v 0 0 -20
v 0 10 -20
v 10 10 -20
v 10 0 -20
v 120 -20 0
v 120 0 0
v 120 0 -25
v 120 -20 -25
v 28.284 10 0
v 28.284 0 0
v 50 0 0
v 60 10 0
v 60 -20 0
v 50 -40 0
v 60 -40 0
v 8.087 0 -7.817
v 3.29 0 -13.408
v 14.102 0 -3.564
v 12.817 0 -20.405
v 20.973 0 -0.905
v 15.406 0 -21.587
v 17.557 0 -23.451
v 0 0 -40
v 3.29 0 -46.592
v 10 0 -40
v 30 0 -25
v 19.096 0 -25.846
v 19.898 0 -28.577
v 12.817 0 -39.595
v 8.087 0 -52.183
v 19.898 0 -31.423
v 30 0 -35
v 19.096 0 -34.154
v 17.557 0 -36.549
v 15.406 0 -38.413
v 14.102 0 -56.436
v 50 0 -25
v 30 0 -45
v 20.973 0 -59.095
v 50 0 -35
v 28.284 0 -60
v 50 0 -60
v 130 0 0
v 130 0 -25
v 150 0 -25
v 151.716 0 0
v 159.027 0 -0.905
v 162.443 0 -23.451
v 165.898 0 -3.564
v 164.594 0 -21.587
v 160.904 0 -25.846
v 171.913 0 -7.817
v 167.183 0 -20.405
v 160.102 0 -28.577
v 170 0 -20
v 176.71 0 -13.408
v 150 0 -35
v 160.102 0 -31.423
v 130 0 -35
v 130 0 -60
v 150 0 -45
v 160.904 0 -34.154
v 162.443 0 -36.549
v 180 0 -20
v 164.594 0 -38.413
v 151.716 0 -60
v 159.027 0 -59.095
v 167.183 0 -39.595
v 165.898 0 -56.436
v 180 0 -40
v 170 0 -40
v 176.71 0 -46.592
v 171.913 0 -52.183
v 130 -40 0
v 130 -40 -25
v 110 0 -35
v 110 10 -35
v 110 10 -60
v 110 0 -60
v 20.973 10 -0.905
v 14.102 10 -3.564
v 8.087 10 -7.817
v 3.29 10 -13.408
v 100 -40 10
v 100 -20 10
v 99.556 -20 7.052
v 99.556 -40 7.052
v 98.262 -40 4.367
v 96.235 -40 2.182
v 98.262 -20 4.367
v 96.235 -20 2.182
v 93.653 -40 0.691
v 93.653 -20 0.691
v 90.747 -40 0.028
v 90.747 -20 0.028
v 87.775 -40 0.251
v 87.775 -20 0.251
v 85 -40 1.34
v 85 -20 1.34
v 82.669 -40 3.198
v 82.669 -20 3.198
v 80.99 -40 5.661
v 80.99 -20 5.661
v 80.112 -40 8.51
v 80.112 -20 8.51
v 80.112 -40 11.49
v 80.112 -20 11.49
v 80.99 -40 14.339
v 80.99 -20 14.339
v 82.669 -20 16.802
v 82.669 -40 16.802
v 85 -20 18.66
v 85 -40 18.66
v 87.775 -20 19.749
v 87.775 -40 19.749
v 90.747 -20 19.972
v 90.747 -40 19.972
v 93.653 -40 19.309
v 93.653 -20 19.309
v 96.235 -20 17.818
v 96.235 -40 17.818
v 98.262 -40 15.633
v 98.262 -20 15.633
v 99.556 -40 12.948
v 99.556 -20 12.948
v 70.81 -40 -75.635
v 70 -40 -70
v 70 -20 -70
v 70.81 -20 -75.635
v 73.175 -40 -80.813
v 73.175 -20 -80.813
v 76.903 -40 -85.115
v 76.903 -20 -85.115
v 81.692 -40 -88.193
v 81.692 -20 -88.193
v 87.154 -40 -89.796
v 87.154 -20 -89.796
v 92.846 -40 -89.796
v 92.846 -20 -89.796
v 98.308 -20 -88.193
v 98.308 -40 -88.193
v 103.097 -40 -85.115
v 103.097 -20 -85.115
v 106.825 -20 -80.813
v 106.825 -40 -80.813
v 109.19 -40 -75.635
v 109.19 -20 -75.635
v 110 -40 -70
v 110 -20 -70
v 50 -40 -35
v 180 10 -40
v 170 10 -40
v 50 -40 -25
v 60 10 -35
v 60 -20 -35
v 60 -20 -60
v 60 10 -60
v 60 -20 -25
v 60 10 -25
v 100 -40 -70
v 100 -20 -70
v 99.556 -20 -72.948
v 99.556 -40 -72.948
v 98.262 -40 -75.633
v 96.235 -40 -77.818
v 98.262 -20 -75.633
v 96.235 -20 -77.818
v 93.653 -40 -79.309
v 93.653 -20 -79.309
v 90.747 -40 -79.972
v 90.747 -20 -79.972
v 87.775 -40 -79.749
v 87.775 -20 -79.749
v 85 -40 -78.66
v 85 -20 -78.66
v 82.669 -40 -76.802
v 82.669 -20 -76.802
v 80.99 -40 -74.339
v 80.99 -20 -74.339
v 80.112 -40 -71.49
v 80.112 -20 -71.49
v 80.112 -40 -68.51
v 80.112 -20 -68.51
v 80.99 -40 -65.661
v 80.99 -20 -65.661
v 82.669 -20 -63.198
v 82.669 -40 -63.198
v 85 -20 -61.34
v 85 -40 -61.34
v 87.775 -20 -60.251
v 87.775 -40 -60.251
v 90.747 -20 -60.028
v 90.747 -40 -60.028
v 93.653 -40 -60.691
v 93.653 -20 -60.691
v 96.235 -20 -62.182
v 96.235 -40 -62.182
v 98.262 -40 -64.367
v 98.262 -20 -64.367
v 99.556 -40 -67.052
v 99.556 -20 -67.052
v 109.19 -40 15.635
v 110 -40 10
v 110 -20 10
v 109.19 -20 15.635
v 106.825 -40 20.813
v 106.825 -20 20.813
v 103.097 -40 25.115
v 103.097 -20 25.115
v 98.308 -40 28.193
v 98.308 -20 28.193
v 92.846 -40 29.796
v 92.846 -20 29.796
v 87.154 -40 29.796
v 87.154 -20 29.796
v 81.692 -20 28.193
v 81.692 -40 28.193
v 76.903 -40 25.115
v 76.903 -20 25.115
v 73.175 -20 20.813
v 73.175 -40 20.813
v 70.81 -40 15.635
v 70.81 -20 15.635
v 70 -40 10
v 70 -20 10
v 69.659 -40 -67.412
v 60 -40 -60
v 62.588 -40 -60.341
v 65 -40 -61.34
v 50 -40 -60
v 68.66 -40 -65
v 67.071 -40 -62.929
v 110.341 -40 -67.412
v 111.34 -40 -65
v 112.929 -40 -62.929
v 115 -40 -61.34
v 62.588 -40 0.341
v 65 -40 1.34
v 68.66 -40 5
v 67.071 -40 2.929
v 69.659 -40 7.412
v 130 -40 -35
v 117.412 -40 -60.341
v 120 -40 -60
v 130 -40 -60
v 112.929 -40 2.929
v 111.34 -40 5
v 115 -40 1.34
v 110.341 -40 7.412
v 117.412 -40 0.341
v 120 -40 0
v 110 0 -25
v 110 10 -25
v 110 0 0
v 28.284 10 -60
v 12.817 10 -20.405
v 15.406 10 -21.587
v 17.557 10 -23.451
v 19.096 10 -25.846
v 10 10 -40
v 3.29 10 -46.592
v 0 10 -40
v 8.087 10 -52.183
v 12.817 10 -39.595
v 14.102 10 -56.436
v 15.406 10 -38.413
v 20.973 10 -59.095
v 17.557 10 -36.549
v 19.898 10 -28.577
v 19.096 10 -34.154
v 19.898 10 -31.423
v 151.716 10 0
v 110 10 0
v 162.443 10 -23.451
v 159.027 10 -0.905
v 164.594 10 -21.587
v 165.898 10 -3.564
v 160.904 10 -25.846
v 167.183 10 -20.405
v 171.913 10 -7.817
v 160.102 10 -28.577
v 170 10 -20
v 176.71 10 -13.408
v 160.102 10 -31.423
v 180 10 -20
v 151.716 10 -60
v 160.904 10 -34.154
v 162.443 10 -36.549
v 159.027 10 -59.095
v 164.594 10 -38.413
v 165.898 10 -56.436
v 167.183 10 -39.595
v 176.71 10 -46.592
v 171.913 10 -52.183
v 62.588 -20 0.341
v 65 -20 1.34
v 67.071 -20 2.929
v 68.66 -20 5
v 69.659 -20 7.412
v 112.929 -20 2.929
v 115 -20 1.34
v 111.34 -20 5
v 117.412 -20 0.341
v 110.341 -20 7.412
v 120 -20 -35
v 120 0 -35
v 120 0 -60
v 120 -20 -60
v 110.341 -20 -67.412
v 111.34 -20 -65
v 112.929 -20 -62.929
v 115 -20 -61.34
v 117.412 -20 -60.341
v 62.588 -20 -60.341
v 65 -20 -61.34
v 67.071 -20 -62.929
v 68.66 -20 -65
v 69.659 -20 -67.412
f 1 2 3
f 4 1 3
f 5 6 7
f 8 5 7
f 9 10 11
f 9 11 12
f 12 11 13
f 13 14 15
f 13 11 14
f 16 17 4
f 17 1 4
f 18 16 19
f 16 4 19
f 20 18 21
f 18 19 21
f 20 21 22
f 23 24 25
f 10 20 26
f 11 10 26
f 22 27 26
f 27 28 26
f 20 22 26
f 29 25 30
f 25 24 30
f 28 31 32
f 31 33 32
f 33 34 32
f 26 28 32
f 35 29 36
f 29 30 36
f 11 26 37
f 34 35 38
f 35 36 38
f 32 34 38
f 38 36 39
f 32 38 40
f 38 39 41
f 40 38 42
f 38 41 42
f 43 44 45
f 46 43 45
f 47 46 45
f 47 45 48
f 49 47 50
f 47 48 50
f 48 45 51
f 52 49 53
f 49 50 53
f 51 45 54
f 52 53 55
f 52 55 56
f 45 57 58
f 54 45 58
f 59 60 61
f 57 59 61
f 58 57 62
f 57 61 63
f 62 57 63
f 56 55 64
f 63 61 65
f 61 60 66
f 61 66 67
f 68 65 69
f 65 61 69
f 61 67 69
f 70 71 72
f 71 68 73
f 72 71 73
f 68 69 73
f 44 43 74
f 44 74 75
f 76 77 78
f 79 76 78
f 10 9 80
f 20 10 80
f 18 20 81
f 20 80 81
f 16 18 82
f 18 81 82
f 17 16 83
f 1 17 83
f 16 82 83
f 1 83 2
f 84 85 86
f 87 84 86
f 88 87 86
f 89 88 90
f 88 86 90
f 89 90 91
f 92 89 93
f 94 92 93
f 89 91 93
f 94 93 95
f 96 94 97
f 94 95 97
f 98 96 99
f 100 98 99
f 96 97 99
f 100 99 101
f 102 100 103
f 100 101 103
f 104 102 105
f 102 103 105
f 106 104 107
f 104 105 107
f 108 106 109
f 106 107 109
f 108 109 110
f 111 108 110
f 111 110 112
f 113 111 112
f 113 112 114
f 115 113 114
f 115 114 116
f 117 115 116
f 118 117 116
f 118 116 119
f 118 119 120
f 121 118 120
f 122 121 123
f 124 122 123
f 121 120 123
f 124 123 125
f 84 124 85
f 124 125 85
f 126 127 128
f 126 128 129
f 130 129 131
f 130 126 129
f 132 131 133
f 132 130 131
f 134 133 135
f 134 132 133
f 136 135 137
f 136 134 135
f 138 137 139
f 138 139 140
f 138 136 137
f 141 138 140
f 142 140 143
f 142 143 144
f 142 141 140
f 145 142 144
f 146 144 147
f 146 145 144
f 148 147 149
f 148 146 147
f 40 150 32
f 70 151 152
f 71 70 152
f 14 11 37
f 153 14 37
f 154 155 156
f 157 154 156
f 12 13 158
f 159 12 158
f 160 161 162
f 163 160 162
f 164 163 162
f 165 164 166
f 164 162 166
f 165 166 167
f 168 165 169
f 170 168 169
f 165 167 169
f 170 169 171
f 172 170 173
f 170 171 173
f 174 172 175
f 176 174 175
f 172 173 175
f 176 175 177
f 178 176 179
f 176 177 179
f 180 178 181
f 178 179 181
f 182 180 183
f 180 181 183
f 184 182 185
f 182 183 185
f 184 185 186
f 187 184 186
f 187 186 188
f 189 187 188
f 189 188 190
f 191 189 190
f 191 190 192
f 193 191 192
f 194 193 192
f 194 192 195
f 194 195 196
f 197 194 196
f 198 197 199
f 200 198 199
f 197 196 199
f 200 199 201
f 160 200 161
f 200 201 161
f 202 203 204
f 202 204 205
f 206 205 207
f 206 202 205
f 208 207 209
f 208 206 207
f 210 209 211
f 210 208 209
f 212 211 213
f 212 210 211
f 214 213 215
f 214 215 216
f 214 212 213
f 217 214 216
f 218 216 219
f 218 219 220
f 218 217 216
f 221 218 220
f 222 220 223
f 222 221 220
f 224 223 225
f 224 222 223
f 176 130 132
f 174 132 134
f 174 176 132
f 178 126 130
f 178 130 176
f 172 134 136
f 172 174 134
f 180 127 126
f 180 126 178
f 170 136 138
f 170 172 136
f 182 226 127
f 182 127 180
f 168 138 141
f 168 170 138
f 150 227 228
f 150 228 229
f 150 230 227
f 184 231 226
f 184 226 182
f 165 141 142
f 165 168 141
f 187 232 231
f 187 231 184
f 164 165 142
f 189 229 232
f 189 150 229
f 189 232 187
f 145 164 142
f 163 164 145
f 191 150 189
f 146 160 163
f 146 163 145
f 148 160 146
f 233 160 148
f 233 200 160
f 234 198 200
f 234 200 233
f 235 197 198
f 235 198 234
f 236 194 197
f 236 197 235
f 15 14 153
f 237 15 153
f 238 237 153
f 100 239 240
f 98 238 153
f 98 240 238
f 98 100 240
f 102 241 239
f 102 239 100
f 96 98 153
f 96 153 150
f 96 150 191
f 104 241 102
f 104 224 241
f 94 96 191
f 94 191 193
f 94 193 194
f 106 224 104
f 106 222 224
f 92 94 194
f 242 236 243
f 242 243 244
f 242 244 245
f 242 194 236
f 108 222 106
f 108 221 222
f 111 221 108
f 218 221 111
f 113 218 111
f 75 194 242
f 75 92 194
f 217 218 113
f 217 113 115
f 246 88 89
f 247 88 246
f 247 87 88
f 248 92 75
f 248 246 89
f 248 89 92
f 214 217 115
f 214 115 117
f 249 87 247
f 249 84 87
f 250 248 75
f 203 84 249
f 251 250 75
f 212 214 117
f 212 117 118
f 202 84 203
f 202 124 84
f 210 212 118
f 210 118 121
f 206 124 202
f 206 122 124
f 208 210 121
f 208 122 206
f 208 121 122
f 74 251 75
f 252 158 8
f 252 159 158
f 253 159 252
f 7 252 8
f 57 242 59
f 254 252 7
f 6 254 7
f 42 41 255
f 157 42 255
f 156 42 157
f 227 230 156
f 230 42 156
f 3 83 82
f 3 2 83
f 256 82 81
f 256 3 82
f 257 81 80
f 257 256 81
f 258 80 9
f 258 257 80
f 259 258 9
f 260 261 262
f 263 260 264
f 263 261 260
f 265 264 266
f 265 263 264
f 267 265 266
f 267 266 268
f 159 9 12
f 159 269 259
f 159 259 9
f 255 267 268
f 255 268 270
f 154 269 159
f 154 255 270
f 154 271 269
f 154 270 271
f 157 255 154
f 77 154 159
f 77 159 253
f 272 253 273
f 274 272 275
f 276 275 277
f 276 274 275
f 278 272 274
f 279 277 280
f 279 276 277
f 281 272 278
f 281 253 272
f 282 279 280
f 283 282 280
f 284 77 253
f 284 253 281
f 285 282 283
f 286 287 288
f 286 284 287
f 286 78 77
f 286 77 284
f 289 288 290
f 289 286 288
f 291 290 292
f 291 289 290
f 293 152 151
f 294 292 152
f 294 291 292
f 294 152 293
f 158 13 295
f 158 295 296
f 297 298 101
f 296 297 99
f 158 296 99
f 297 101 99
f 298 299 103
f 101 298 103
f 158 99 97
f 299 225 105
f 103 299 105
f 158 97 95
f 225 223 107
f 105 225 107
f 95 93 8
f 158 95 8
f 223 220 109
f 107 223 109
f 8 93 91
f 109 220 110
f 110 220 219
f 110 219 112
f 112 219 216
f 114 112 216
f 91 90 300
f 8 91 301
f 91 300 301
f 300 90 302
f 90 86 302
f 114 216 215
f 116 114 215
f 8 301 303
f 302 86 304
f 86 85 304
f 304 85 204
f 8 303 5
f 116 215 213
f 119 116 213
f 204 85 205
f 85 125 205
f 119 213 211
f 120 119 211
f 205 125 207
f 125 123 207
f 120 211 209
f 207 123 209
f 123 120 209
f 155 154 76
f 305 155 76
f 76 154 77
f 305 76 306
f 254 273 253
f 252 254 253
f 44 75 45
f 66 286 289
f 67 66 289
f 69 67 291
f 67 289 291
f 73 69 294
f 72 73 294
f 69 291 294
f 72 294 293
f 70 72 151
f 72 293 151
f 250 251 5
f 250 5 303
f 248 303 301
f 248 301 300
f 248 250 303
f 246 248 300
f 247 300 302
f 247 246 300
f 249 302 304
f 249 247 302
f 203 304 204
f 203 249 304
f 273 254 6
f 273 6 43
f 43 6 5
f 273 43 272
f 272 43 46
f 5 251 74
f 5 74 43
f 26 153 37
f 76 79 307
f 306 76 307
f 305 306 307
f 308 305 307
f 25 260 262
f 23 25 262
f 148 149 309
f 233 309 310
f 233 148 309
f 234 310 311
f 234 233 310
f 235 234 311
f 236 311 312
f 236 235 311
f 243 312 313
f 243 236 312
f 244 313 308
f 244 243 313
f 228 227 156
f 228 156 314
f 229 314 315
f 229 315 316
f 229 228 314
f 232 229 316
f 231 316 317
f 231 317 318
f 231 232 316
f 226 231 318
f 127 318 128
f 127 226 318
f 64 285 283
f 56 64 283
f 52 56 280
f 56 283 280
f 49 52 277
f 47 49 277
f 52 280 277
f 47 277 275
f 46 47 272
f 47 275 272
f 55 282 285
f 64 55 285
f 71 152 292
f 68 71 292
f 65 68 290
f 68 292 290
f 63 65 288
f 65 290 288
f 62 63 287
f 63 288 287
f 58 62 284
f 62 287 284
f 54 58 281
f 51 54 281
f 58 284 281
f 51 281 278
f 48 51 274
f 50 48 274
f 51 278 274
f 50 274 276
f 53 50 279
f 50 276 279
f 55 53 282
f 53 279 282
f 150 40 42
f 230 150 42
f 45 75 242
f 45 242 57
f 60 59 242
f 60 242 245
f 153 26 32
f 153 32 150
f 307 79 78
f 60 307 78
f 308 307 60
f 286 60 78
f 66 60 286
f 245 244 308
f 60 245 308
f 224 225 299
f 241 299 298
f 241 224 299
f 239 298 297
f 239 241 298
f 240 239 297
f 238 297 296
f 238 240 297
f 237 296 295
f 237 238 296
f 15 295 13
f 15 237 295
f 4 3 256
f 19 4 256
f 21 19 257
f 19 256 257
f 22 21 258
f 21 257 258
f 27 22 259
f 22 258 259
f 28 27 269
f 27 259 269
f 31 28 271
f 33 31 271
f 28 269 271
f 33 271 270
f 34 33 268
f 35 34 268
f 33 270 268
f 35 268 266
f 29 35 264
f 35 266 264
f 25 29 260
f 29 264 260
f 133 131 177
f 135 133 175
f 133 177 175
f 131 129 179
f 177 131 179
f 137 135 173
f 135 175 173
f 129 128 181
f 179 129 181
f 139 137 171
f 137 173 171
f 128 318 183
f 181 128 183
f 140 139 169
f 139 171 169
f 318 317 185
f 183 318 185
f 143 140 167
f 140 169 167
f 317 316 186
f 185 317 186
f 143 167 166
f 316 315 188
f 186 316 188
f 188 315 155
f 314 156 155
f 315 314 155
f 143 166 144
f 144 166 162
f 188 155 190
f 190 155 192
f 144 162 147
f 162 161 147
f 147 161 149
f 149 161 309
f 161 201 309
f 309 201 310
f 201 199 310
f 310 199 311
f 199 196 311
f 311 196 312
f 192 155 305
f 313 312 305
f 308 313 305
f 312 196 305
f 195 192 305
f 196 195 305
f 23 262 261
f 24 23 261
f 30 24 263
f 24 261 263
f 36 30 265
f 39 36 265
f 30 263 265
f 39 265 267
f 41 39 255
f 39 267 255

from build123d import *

# Parameters (mm, degrees)
SKETCH1_W           = 180
SKETCH1_H           = 60
BOSS_EXTRUDE1_DEPTH = 10
CUT_EXTRUDE1_DEPTH  = 10
SKETCH3_W           = 10
SKETCH3_H           = 60
BOSS_EXTRUDE2_DEPTH = 40
SKETCH4_W           = 10
SKETCH4_H           = 40
BOSS_EXTRUDE3_DEPTH = 20
CUT_EXTRUDE2_DEPTH  = 20
SKETCH6_W           = 10
SKETCH6_H           = 40
BOSS_EXTRUDE4_DEPTH = 20
CUT_EXTRUDE3_DEPTH  = 20
BOSS_EXTRUDE5_DEPTH = 20
SKETCH10_R          = 10
CUT_EXTRUDE4_DEPTH  = 20
SKETCH11_W          = 50
SKETCH11_H          = 25
CUT_EXTRUDE5_DEPTH  = 20
SKETCH12_W          = 60
SKETCH12_H          = 20
BOSS_EXTRUDE6_DEPTH = 10


with BuildPart() as part:
    # Sketch1 → Boss-Extrude1 (new body)
    with BuildSketch(Plane(origin=(0, 0, 0), x_dir=(1, 0, 0), z_dir=(0, 1, 0))):
        with Locations((90, 30)):
            Rectangle(SKETCH1_W, SKETCH1_H)
    extrude(amount=BOSS_EXTRUDE1_DEPTH)

    # Sketch2 → Cut-Extrude1 (cut)
    with BuildSketch(Plane(origin=(0, 10, 0), x_dir=(1, 0, 0), z_dir=(0, 1, 0))):
        with BuildLine():
            Line((0, 60), (0, 40))
            ThreePointArc((0, 40), (10.963763172, 54.494897428), (28.284271247, 60))
            Line((28.284271247, 60), (0, 60))
        make_face()
        with BuildLine():
            Line((10, 40), (0, 40))
            Line((0, 40), (0, 20))
            Line((0, 20), (10, 20))
            ThreePointArc((10, 20), (20, 30), (10, 40))
        make_face()
        with BuildLine():
            ThreePointArc((28.284271247, 0), (10.963763172, 5.505102572), (0, 20))
            Line((0, 20), (0, 0))
            Line((0, 0), (28.284271247, 0))
        make_face()
        with BuildLine():
            ThreePointArc((180, 20), (169.036236828, 5.505102572), (151.715728753, 0))
            Line((151.715728753, 0), (180, 0))
            Line((180, 0), (180, 20))
        make_face()
        with BuildLine():
            Line((180, 20), (180, 40))
            Line((180, 40), (170, 40))
            ThreePointArc((170, 40), (160, 30), (170, 20))
            Line((170, 20), (180, 20))
        make_face()
        with BuildLine():
            Line((180, 60), (151.715728753, 60))
            ThreePointArc((151.715728753, 60), (169.036236828, 54.494897428), (180, 40))
            Line((180, 40), (180, 60))
        make_face()
    extrude(amount=-CUT_EXTRUDE1_DEPTH, mode=Mode.SUBTRACT)

    # Sketch3 → Boss-Extrude2 (add)
    with BuildSketch(Plane(origin=(0, 0, 0), x_dir=(-1, 0, 0), z_dir=(0, -1, 0))):
        with Locations((-55, 30)):
            Rectangle(SKETCH3_W, SKETCH3_H)
        with Locations((-125, 30)):
            Rectangle(SKETCH3_W, SKETCH3_H)
    extrude(amount=BOSS_EXTRUDE2_DEPTH)

    # Sketch4 → Boss-Extrude3 (add)
    with BuildSketch(Plane.ZY.offset(-50)):
        with Locations((-30, -20)):
            Rectangle(SKETCH4_W, SKETCH4_H)
    extrude(amount=BOSS_EXTRUDE3_DEPTH)

    # Sketch5 → Cut-Extrude2 (cut)
    with BuildSketch(Plane.XY.offset(-25)):
        Polygon((30, 0), (50, -40), (30, -40), align=None)
    extrude(amount=-CUT_EXTRUDE2_DEPTH, mode=Mode.SUBTRACT)

    # Sketch6 → Boss-Extrude4 (add)
    with BuildSketch(Plane(origin=(130, 0, 0), x_dir=(0, 0, -1), z_dir=(1, 0, 0))):
        with Locations((30, -20)):
            Rectangle(SKETCH6_W, SKETCH6_H)
    extrude(amount=BOSS_EXTRUDE4_DEPTH)

    # Sketch7 → Cut-Extrude3 (cut)
    with BuildSketch(Plane.XY.offset(-25)):
        Polygon((130, -40), (150, 0), (150, -40), align=None)
    extrude(amount=-CUT_EXTRUDE3_DEPTH, mode=Mode.SUBTRACT)

    # Sketch9 → Boss-Extrude5 (add)
    with BuildSketch(Plane.XZ.offset(40)):
        with BuildLine():
            Line((60, 0), (60, -60))
            ThreePointArc((60, -60), (67.071067812, -62.928932188), (70, -70))
            ThreePointArc((70, -70), (90, -90), (110, -70))
            ThreePointArc((110, -70), (112.928932188, -62.928932188), (120, -60))
            Line((120, -60), (120, 0))
            ThreePointArc((120, 0), (112.928932188, 2.928932188), (110, 10))
            ThreePointArc((110, 10), (90, 30), (70, 10))
            ThreePointArc((70, 10), (67.071067812, 2.928932188), (60, 0))
        make_face()
    extrude(amount=-BOSS_EXTRUDE5_DEPTH)

    # Sketch10 → Cut-Extrude4 (cut)
    with BuildSketch(Plane(origin=(0, -20, 0), x_dir=(1, 0, 0), z_dir=(0, 1, 0))):
        with Locations((90, 70)):
            Circle(SKETCH10_R)
        with Locations((90, -10)):
            Circle(SKETCH10_R)
    extrude(amount=-CUT_EXTRUDE4_DEPTH, mode=Mode.SUBTRACT)

    # Sketch11 → Cut-Extrude5 (cut)
    with BuildSketch(Plane(origin=(0, 10, 0), x_dir=(1, 0, 0), z_dir=(0, 1, 0))):
        with Locations((85, 47.5)):
            Rectangle(SKETCH11_W, SKETCH11_H)
        with Locations((85, 12.5)):
            Rectangle(SKETCH11_W, SKETCH11_H)
    extrude(amount=-CUT_EXTRUDE5_DEPTH, mode=Mode.SUBTRACT)

    # Sketch12 → Boss-Extrude6 (add)
    with BuildSketch(Plane.XY.offset(-25)):
        with Locations((90, -10)):
            Rectangle(SKETCH12_W, SKETCH12_H)
    extrude(amount=-BOSS_EXTRUDE6_DEPTH)


solid = part.part
